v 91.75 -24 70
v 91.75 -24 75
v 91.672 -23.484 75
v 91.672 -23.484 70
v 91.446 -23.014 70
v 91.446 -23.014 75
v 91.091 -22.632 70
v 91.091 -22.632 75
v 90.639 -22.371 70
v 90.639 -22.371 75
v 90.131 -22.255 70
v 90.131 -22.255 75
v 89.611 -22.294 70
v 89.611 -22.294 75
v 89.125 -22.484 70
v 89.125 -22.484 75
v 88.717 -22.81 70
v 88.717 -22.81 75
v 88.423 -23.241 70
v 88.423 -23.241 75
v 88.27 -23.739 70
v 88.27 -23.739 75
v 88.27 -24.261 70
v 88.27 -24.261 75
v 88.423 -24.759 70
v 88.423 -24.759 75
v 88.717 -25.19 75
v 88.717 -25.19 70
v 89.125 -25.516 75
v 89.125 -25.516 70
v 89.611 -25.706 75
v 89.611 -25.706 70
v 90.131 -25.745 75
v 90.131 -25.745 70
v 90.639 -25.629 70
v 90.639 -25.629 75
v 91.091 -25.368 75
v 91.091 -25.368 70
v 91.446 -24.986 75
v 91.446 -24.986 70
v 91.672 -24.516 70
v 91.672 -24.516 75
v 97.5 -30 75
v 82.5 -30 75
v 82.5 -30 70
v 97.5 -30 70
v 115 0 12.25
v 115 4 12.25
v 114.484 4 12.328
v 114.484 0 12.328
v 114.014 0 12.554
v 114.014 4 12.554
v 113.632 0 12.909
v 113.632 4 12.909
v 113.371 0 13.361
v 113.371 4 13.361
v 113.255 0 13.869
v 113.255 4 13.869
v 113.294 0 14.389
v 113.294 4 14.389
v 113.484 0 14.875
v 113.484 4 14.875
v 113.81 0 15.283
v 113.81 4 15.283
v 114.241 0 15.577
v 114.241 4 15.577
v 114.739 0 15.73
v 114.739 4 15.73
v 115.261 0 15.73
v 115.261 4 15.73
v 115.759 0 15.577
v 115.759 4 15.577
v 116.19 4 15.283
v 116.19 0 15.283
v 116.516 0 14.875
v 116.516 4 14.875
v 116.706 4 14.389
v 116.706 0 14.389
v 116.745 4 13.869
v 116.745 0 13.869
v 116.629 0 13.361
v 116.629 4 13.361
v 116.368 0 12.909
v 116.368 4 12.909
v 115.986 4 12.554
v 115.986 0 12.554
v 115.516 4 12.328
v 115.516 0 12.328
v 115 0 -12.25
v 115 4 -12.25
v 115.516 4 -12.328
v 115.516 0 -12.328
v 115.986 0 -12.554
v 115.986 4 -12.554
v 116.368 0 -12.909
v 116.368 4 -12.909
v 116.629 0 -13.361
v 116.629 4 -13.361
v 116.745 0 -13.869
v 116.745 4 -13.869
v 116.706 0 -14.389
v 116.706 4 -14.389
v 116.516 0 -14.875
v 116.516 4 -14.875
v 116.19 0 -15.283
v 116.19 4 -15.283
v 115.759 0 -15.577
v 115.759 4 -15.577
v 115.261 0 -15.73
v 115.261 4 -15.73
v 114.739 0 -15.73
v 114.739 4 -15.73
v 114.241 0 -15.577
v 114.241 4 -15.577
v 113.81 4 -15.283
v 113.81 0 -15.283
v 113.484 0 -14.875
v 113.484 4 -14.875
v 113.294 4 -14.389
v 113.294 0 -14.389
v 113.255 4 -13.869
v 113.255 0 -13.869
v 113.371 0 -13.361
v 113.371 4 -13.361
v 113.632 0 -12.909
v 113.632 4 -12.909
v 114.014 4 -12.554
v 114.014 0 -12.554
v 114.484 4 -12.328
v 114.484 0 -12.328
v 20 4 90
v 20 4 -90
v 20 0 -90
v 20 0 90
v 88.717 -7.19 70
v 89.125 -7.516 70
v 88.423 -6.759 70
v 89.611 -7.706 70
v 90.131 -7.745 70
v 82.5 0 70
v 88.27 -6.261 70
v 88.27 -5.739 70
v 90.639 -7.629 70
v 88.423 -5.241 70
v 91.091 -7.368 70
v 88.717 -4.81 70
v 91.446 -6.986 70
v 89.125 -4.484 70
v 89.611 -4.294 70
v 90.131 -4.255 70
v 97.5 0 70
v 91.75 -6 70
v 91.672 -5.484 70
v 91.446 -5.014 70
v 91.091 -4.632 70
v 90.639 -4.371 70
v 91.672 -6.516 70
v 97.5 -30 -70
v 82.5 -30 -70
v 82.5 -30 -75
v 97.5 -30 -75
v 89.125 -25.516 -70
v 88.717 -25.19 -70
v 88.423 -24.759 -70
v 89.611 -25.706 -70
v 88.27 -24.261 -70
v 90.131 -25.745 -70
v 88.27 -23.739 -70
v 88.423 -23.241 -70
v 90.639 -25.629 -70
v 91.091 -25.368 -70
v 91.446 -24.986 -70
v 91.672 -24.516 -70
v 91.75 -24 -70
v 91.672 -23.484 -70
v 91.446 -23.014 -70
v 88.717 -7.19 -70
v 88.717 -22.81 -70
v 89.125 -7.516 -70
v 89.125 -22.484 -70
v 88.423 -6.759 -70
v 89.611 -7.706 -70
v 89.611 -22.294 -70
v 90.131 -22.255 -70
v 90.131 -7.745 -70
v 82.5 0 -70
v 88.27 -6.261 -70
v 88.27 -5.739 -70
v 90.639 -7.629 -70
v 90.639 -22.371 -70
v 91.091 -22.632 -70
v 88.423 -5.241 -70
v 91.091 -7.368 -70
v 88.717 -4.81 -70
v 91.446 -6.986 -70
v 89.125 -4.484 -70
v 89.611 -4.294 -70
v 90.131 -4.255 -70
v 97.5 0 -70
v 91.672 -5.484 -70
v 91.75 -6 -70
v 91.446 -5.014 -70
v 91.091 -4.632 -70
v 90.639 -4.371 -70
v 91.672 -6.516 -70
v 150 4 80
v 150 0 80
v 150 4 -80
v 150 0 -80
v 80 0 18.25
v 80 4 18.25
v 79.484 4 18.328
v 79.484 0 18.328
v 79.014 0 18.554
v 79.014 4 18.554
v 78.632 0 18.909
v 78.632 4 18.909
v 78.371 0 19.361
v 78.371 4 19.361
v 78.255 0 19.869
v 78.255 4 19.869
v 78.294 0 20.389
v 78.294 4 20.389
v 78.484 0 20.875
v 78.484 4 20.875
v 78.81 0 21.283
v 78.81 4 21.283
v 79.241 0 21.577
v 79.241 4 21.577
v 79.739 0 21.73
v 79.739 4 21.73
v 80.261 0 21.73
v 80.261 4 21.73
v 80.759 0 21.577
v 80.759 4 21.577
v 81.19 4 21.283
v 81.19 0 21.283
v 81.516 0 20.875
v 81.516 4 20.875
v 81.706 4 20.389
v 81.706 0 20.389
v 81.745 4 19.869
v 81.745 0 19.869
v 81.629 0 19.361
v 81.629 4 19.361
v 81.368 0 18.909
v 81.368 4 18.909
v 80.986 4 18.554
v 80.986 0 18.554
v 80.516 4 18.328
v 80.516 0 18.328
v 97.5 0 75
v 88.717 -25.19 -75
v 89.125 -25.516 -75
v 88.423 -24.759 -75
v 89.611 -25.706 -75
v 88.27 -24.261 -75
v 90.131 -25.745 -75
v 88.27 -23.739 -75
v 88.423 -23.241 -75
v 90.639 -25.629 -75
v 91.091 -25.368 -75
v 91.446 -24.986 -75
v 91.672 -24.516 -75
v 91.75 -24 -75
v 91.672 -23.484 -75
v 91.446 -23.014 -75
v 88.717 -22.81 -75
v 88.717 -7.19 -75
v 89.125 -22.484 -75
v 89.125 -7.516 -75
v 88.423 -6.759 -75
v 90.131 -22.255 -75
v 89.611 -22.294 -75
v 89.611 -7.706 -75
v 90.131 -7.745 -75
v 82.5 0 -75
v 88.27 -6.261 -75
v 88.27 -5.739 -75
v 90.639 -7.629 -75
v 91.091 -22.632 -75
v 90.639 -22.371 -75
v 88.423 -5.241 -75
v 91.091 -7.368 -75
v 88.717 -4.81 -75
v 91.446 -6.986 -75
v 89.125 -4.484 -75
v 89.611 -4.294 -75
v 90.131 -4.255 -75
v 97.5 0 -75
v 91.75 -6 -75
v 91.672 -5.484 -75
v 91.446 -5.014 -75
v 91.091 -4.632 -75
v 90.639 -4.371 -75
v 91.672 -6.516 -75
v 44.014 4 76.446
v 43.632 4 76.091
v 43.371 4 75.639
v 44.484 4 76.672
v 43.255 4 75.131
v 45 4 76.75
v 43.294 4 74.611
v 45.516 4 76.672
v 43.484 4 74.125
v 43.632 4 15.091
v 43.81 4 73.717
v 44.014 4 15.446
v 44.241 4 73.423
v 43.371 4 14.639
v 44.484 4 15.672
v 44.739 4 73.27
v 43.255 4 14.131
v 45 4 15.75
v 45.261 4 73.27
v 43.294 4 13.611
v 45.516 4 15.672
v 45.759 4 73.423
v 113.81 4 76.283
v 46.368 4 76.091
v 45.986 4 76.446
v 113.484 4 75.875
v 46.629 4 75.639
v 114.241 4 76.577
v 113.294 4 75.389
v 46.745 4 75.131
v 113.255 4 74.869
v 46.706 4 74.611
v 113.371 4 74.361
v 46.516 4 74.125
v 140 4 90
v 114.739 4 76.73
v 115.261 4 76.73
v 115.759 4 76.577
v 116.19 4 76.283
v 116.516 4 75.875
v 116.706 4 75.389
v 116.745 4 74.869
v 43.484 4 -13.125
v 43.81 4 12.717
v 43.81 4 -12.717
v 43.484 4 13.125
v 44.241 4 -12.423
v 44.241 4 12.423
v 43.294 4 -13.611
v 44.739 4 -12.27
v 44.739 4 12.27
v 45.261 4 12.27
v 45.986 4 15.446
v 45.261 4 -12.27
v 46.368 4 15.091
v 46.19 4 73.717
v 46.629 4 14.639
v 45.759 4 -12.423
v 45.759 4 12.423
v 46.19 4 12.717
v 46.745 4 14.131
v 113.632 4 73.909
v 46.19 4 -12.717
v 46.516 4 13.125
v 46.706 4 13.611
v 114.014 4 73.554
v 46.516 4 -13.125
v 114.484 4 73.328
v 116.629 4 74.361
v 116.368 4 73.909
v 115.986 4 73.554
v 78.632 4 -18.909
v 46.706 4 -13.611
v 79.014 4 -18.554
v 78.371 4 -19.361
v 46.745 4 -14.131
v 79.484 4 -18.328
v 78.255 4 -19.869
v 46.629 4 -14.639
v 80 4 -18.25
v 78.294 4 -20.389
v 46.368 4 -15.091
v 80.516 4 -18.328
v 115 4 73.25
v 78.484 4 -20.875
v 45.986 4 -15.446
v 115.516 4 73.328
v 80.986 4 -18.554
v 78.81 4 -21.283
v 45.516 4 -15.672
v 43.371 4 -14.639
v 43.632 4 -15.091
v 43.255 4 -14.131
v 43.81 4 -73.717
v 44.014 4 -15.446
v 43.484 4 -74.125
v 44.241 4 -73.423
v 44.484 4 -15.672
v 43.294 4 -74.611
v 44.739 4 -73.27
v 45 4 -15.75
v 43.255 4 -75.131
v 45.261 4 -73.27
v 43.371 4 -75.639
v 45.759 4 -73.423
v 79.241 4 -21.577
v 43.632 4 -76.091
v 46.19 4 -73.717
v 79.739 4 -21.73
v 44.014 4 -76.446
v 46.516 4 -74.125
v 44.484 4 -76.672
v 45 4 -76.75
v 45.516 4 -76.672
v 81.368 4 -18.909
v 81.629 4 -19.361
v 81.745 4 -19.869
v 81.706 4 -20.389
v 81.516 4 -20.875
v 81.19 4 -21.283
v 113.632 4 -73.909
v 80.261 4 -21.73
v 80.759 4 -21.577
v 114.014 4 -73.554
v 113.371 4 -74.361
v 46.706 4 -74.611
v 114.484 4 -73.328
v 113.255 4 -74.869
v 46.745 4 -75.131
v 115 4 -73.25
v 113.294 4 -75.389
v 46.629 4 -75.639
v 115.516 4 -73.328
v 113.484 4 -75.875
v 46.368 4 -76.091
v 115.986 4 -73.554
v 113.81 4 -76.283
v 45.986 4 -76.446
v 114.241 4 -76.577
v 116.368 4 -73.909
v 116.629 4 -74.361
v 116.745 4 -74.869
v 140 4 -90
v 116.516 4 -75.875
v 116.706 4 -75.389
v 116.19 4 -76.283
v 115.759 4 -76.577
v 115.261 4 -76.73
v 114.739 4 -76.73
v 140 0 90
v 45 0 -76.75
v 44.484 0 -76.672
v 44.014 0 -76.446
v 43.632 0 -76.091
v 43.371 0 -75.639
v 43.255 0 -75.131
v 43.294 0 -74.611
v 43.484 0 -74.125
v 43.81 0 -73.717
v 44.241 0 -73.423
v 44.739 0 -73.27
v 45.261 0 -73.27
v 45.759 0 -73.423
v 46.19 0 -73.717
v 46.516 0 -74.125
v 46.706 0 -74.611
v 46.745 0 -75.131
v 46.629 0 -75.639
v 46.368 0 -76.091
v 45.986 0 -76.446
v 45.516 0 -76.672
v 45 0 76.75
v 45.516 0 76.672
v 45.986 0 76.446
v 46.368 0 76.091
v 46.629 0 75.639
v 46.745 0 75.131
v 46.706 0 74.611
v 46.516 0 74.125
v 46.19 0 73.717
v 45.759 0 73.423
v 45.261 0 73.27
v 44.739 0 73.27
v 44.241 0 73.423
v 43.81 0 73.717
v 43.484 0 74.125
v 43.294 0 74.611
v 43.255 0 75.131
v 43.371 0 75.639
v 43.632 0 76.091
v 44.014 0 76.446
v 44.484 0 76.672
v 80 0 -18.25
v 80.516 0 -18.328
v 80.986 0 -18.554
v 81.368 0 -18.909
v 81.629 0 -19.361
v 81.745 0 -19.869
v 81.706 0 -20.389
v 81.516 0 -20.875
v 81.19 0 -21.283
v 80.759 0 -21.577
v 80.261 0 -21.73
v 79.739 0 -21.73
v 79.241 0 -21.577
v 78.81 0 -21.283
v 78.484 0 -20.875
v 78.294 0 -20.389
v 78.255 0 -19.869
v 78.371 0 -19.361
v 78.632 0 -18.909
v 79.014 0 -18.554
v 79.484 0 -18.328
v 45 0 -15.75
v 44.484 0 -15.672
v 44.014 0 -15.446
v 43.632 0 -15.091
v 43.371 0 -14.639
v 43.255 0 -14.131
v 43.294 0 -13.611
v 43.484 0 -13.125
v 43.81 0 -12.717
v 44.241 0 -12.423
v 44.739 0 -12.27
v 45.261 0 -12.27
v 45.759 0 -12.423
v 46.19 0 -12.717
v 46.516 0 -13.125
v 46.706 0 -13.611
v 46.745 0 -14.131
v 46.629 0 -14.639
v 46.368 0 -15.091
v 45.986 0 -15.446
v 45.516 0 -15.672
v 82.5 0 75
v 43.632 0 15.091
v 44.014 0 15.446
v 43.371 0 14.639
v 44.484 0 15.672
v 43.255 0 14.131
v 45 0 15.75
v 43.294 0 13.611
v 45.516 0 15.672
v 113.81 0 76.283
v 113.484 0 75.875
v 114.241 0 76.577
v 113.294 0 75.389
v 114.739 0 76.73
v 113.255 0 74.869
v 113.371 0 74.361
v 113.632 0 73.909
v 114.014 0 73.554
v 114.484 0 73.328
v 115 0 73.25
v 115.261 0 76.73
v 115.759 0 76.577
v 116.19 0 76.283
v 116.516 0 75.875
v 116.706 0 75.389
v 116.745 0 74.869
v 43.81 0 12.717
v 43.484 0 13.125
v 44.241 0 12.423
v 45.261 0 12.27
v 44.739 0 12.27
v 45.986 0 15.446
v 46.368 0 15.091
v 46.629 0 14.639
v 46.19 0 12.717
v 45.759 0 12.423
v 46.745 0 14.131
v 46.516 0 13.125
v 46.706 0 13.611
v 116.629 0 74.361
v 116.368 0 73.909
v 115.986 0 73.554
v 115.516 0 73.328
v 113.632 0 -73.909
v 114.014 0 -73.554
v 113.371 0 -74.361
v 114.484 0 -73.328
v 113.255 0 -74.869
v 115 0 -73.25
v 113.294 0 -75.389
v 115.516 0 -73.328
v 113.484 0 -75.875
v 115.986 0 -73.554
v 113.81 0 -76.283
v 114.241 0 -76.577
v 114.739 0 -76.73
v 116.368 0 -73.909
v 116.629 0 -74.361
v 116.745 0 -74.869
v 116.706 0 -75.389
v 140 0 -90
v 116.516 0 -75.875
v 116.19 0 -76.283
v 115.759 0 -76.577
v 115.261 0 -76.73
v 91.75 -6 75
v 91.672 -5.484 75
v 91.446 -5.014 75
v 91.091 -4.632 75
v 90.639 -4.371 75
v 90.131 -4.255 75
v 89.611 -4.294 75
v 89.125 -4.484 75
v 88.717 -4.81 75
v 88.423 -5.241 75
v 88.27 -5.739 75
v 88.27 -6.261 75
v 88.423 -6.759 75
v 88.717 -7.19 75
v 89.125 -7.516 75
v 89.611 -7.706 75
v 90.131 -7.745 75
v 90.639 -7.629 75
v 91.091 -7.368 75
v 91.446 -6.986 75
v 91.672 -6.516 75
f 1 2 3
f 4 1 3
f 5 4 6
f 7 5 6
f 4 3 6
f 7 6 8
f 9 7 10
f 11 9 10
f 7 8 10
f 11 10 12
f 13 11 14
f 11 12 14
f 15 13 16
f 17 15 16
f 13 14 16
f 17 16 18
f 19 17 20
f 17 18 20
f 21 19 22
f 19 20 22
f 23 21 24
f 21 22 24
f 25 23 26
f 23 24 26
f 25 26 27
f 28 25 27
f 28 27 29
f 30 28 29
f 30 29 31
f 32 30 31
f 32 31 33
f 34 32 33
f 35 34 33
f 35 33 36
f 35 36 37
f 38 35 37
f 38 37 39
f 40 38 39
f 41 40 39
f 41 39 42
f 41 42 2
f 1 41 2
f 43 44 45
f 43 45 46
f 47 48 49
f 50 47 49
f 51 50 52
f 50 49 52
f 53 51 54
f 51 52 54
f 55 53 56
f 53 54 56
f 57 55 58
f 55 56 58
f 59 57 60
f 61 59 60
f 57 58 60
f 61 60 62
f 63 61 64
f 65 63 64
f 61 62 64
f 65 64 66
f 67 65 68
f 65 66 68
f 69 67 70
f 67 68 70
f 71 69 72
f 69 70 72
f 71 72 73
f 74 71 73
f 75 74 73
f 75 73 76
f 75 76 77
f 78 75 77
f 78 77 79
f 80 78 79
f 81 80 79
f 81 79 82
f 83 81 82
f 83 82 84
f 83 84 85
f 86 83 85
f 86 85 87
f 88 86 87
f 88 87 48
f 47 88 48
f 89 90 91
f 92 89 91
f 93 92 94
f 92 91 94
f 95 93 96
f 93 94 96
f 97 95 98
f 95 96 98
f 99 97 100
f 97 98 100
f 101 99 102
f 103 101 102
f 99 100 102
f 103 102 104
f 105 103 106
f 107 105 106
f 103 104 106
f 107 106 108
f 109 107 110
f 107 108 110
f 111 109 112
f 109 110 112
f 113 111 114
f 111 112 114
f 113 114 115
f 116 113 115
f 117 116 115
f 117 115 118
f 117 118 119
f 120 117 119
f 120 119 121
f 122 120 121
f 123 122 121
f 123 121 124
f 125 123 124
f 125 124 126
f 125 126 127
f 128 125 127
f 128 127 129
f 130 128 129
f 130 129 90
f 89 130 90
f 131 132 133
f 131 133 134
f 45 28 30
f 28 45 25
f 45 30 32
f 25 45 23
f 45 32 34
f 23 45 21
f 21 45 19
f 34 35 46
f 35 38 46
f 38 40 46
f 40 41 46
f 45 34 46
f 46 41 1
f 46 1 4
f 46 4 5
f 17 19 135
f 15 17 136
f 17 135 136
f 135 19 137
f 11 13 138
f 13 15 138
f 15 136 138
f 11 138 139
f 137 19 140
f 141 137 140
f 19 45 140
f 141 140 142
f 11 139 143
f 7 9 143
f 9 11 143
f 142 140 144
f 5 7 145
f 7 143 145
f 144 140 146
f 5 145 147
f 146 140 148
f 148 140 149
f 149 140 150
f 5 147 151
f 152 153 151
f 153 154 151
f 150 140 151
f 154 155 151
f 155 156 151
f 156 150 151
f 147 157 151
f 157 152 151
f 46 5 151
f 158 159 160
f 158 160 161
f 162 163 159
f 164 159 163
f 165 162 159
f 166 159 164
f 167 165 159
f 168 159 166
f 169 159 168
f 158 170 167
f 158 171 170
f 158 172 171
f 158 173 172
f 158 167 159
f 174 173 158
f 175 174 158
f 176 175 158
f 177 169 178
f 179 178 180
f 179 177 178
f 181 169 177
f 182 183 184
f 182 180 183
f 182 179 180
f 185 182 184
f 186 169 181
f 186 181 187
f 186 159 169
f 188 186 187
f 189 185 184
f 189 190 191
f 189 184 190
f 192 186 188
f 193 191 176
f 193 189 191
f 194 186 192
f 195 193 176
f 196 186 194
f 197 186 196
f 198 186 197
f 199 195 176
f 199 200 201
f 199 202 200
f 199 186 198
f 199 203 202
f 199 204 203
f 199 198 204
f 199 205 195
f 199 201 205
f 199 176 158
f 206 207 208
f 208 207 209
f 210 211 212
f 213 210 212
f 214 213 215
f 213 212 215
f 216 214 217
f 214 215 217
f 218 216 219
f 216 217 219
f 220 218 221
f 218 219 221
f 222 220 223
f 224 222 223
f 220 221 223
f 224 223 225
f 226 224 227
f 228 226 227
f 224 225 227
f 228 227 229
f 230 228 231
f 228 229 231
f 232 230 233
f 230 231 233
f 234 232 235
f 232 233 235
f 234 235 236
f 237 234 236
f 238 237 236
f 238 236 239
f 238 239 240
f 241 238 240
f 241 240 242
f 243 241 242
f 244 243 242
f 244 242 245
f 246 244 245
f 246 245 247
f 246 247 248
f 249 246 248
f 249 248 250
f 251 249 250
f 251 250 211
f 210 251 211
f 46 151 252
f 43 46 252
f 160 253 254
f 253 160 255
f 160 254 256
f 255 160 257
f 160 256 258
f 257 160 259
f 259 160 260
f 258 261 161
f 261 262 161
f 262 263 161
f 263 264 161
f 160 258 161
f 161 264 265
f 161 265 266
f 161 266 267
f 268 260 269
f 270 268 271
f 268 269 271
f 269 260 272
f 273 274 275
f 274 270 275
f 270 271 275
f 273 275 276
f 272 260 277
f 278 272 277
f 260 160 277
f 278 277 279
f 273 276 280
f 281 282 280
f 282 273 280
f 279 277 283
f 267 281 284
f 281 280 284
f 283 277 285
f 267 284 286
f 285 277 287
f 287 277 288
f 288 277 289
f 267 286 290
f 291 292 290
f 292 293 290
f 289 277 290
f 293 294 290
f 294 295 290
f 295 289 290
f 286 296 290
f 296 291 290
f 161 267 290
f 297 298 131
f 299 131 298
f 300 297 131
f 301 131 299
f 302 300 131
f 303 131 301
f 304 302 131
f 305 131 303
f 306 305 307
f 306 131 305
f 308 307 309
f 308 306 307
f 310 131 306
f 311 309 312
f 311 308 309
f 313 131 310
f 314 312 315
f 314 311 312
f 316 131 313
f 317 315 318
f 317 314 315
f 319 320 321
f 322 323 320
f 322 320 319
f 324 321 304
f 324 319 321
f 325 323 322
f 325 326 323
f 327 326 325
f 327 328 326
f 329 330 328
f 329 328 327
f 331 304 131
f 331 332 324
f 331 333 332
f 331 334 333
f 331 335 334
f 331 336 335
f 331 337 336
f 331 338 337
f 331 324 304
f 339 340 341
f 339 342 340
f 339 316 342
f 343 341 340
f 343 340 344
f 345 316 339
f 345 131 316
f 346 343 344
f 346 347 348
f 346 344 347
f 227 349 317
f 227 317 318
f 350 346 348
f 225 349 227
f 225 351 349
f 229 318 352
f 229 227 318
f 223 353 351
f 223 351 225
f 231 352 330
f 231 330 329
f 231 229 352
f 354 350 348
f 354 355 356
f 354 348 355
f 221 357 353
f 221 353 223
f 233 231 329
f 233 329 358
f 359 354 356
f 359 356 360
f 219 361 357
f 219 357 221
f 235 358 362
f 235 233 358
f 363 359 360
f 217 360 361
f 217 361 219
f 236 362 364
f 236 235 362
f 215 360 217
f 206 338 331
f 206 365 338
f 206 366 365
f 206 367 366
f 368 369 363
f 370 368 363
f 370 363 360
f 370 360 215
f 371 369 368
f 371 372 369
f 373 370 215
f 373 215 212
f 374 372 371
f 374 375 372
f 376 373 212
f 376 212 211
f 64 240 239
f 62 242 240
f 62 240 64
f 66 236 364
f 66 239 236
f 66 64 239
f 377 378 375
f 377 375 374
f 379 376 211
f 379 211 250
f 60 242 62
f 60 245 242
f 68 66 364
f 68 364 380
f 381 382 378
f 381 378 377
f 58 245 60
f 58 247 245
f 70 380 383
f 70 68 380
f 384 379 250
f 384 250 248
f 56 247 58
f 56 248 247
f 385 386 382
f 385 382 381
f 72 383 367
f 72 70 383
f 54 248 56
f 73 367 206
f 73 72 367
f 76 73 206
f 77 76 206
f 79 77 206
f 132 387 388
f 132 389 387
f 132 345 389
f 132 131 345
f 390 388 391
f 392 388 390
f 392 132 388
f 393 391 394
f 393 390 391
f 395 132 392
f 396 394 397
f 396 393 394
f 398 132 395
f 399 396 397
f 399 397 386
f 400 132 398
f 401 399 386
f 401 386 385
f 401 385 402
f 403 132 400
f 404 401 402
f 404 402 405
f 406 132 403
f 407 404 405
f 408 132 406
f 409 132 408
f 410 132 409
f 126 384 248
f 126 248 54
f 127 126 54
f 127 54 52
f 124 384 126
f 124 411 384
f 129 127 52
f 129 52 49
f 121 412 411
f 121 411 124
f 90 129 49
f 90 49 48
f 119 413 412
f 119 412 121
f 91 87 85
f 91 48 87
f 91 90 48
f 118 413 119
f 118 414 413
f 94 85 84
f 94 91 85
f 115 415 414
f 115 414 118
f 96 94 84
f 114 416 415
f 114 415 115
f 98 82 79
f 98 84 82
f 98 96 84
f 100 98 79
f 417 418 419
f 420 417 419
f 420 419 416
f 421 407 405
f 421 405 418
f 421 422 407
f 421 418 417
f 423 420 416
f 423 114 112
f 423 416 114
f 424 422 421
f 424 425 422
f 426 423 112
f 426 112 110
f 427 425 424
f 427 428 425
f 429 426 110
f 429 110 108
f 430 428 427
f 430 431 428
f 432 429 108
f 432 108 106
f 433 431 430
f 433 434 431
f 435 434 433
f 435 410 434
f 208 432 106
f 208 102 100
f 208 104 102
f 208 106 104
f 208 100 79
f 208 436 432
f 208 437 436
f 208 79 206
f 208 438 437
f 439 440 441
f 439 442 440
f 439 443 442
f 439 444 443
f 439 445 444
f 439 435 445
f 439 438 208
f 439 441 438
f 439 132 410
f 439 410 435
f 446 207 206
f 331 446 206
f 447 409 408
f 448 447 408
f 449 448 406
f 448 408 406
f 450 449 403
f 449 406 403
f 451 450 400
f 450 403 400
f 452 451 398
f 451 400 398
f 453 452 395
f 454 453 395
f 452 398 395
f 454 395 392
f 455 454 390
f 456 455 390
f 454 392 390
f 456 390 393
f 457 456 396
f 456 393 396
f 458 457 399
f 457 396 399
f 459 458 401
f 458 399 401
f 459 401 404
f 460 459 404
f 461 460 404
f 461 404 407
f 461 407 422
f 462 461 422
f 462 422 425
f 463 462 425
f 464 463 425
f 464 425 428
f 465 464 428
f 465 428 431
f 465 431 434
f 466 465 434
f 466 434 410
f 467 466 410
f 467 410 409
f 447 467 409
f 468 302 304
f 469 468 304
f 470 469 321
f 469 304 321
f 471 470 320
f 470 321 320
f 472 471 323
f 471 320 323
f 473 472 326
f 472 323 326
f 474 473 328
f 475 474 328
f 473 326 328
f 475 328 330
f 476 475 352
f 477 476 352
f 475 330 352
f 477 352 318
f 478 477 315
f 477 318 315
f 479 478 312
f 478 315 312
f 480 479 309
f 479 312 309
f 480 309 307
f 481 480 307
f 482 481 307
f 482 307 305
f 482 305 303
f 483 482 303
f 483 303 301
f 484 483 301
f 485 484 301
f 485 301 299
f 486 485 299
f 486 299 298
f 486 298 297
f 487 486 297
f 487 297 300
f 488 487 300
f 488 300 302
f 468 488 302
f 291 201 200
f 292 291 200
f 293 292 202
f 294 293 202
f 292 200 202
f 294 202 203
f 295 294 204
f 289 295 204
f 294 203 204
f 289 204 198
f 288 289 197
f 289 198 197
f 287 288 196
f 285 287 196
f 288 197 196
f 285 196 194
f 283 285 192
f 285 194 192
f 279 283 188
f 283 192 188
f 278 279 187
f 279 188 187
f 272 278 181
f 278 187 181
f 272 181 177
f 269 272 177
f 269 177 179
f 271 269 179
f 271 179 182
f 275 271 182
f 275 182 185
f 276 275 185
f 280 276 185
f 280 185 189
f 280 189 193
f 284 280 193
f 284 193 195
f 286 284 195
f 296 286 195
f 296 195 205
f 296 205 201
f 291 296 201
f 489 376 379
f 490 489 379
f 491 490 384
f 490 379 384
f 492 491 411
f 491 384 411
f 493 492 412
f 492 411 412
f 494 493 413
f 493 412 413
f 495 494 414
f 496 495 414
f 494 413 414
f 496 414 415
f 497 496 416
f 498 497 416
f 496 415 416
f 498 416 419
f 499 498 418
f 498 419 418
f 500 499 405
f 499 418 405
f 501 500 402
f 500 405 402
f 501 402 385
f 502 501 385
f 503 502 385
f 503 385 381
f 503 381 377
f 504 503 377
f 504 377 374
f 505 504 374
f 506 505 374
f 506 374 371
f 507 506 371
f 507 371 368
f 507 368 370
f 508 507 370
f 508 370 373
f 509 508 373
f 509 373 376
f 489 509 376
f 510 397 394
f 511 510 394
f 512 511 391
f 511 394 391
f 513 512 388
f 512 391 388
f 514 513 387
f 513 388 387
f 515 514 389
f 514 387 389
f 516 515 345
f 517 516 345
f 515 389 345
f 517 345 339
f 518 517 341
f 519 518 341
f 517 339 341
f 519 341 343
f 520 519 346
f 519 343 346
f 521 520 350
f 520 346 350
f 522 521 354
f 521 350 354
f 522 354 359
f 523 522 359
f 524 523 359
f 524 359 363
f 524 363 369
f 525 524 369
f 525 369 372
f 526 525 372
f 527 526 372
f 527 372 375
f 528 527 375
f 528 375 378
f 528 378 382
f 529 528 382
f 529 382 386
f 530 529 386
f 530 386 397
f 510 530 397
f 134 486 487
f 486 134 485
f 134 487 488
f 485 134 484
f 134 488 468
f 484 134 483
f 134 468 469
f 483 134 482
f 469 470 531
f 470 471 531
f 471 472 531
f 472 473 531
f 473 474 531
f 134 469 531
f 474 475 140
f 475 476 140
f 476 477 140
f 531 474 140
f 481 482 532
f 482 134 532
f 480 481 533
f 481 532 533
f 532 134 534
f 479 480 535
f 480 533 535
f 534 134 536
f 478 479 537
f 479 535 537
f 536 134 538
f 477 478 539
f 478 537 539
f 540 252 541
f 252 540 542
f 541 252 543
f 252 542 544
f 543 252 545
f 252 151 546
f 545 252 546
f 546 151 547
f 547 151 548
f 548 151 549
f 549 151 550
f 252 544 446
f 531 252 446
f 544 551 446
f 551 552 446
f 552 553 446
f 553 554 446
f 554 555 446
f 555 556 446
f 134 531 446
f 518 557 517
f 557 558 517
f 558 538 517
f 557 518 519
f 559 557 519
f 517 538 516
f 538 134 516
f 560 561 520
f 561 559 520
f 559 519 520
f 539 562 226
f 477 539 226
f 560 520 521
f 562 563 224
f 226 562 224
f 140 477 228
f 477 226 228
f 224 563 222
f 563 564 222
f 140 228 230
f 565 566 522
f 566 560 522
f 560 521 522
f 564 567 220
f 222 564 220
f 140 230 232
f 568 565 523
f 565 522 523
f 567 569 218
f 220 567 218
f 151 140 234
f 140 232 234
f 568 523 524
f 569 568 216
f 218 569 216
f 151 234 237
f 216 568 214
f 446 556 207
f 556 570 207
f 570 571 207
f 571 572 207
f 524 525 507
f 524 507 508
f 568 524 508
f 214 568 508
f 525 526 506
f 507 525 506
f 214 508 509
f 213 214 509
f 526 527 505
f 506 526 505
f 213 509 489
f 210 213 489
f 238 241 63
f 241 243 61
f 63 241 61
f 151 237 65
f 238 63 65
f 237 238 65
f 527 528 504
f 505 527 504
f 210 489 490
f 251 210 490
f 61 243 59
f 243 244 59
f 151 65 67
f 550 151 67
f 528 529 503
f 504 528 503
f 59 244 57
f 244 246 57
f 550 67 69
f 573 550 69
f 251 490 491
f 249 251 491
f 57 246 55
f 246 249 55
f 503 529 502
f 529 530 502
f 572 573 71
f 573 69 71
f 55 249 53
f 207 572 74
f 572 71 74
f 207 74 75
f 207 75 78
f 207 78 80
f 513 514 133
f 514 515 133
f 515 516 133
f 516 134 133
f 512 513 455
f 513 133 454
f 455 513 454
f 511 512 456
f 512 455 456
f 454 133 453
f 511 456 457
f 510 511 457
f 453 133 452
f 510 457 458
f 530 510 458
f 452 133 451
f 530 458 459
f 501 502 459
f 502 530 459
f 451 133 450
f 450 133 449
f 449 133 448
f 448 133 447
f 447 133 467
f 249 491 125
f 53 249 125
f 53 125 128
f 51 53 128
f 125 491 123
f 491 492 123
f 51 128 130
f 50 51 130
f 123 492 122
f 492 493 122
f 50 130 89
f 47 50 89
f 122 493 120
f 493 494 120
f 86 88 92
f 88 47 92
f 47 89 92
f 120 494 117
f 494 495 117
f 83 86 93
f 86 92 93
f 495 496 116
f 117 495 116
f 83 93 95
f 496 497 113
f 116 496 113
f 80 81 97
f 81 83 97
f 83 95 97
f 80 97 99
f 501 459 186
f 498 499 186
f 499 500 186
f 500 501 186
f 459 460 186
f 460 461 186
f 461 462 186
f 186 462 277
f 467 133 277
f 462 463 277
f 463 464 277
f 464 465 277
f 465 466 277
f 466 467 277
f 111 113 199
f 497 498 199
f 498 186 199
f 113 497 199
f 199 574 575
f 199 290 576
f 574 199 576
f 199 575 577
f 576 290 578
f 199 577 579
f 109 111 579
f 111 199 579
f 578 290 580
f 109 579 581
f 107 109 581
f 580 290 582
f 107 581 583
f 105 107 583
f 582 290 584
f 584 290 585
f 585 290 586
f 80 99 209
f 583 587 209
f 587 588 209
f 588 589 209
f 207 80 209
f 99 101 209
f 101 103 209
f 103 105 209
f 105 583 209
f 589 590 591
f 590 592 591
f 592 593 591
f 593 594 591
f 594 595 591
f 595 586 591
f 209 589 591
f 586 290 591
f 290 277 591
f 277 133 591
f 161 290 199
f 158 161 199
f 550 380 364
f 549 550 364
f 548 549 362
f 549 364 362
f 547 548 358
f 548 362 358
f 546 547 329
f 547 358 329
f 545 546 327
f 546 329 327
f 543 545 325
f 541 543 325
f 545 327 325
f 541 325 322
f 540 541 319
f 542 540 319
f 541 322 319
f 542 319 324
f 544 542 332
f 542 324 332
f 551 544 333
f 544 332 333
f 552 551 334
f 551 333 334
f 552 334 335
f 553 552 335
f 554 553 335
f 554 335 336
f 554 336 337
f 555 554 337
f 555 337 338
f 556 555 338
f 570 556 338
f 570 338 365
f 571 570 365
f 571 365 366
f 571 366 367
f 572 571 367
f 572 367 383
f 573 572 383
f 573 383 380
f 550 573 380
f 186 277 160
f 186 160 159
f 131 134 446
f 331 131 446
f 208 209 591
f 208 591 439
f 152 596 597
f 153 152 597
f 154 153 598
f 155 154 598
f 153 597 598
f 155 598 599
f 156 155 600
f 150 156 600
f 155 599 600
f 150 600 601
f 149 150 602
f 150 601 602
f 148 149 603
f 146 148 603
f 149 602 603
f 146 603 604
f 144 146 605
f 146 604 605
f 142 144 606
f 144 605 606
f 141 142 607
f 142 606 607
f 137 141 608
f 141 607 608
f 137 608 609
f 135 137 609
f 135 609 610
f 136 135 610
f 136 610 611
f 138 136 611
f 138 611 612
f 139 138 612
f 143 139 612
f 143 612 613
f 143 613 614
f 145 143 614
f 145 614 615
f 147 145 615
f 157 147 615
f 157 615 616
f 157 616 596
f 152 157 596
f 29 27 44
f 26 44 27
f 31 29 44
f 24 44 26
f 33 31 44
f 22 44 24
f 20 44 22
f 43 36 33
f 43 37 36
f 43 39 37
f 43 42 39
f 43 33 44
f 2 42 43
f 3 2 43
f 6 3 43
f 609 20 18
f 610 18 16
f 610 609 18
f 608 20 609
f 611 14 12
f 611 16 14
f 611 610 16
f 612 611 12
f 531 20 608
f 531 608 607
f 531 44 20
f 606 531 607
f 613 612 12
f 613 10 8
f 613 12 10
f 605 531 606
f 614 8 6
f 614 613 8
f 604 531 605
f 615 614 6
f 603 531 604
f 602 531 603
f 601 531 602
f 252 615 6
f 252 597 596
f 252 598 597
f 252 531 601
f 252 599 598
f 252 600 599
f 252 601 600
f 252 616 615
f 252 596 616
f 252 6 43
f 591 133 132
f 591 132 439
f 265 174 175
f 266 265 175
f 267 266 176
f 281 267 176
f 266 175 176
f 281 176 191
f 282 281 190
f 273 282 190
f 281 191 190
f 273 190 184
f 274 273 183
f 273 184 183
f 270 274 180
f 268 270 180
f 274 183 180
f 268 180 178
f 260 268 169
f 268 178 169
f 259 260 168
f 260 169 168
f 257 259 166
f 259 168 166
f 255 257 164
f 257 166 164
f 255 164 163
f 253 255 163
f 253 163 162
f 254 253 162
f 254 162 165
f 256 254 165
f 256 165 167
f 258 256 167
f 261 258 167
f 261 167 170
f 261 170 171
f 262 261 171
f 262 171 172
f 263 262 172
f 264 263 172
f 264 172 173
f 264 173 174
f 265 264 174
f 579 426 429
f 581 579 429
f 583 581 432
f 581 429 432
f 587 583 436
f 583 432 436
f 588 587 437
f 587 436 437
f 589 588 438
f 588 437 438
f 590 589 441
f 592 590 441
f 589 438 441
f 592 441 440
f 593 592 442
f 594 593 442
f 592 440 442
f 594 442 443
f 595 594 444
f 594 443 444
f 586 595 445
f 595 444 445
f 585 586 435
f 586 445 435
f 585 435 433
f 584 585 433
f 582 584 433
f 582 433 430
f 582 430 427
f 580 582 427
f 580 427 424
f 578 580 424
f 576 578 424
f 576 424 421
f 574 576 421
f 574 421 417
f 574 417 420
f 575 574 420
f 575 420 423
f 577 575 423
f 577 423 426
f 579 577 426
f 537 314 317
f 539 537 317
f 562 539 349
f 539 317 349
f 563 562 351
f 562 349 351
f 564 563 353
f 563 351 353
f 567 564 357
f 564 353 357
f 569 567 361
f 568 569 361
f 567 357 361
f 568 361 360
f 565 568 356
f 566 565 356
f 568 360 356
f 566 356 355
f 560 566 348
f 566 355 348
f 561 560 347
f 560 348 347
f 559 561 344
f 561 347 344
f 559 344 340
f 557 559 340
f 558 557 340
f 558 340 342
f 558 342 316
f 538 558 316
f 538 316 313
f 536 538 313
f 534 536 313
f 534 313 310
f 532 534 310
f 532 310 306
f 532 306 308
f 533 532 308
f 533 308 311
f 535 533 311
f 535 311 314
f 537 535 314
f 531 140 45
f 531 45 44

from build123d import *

# Parameters (mm, degrees)
SKETCH1_W               = 300
SKETCH1_H               = 180
MAIN_BODY_DEPTH         = 4
FILLET1_R               = 10
CHAMFER1_SIZE           = 10
SKETCH2_R               = 1.75
BATTERIES_HOLES_DEPTH   = 15
SKETCH5_R               = 1.75
SKETCH5_W               = 15
SKETCH5_H               = 10
L298N_HOLES_DEPTH       = 15
SKETCH6_R               = 1.75
LM2596_HOLES_DEPTH      = 15
SKETCH7_R               = 1.55
ESP32_HOLES_DEPTH       = 15
SKETCH8_R               = 1.75
PCB_SENSORS_HOLES_DEPTH = 15
SKETCH9_W               = 15
SKETCH9_H               = 5
WHEELS_LEGS_DEPTH       = 30
SKETCH10_R              = 1.75
MOTOR_HOLES_DEPTH       = 300
SKETCH11_R              = 1.75
SKETCH11_W              = 30
SKETCH11_H              = 20
SENSORS_HOLES_DEPTH     = 15
SKETCH13_W              = 40
SKETCH13_H              = 75
CUT_EXTRUDE2_DEPTH      = 10
FILLET2_R               = 10
SKETCH12_R              = 1.75
CUT_EXTRUDE3_DEPTH      = 10
SKETCH14_W              = 212.137898895
SKETCH14_H              = 97.482026014
CUT_EXTRUDE4_DEPTH      = 200


with BuildPart() as part:
    # Sketch1 → Main Body (new body)
    with BuildSketch(Plane(origin=(0, 0, 0), x_dir=(1, 0, 0), z_dir=(0, 1, 0))):
        Rectangle(SKETCH1_W, SKETCH1_H)
    extrude(amount=MAIN_BODY_DEPTH)

    # Fillet1
    fillet1_edges = [part.edges().sort_by_distance(p)[0] for p in [
        (-150, 2, 90),
        (-150, 2, -90),
    ]]
    fillet(fillet1_edges, radius=FILLET1_R)

    # Chamfer1
    chamfer1_edges = [part.edges().sort_by_distance(p)[0] for p in [
        (150, 2, 90),
        (150, 2, -90),
    ]]
    chamfer(chamfer1_edges, length=CHAMFER1_SIZE)

    # Sketch2 → Batteries holes (cut)
    with BuildSketch(Plane(origin=(0, 4, 0), x_dir=(1, 0, 0), z_dir=(0, 1, 0))):
        with Locations((115, 75)):
            Circle(SKETCH2_R)
        with Locations((115, 14)):
            Circle(SKETCH2_R)
        with Locations((115, -14)):
            Circle(SKETCH2_R)
        with Locations((115, -75)):
            Circle(SKETCH2_R)
        with Locations((45, -75)):
            Circle(SKETCH2_R)
        with Locations((45, -14)):
            Circle(SKETCH2_R)
        with Locations((45, 14)):
            Circle(SKETCH2_R)
        with Locations((45, 75)):
            Circle(SKETCH2_R)
    extrude(amount=-BATTERIES_HOLES_DEPTH, mode=Mode.SUBTRACT)

    # Sketch5 → L298N holes (cut)
    with BuildSketch(Plane(origin=(0, 4, 0), x_dir=(1, 0, 0), z_dir=(0, 1, 0))):
        with Locations((-37, 18.5)):
            Circle(SKETCH5_R)
        with Locations((0, 18.5)):
            Circle(SKETCH5_R)
        with Locations((-37, -18.5)):
            Circle(SKETCH5_R)
        with Locations((0, -18.5)):
            Circle(SKETCH5_R)
        with Locations((-12.5, -38.5)):
            Rectangle(SKETCH5_W, SKETCH5_H)
        with Locations((-12.5, 38.5)):
            Rectangle(SKETCH5_W, SKETCH5_H)
    extrude(amount=-L298N_HOLES_DEPTH, mode=Mode.SUBTRACT)

    # Sketch6 → LM2596 holes (cut)
    with BuildSketch(Plane(origin=(0, 4, 0), x_dir=(1, 0, 0), z_dir=(0, 1, 0))):
        with Locations((-33, 70)):
            Circle(SKETCH6_R)
        with Locations((-3, 54)):
            Circle(SKETCH6_R)
        with Locations((-33, -54)):
            Circle(SKETCH6_R)
        with Locations((-3, -70)):
            Circle(SKETCH6_R)
    extrude(amount=-LM2596_HOLES_DEPTH, mode=Mode.SUBTRACT)

    # Sketch7 → ESP32 holes (cut)
    with BuildSketch(Plane(origin=(0, 4, 0), x_dir=(1, 0, 0), z_dir=(0, 1, 0))):
        with Locations((-73, 65)):
            Circle(SKETCH7_R)
        with Locations((-73, 19)):
            Circle(SKETCH7_R)
        with Locations((-91, 19)):
            Circle(SKETCH7_R)
    extrude(amount=-ESP32_HOLES_DEPTH, mode=Mode.SUBTRACT)

    # Sketch8 → PCB sensors holes (cut)
    with BuildSketch(Plane(origin=(0, 4, 0), x_dir=(1, 0, 0), z_dir=(0, 1, 0))):
        with Locations((-103, -54)):
            Circle(SKETCH8_R)
        with Locations((-68, -54)):
            Circle(SKETCH8_R)
    extrude(amount=-PCB_SENSORS_HOLES_DEPTH, mode=Mode.SUBTRACT)

    # Sketch9 → Wheels legs (add)
    with BuildSketch(Plane.XZ):
        with Locations((-90, 72.5)):
            Rectangle(SKETCH9_W, SKETCH9_H)
        with Locations((90, 72.5)):
            Rectangle(SKETCH9_W, SKETCH9_H)
        with Locations((90, -72.5)):
            Rectangle(SKETCH9_W, SKETCH9_H)
        with Locations((-90, -72.5)):
            Rectangle(SKETCH9_W, SKETCH9_H)
    extrude(amount=WHEELS_LEGS_DEPTH)

    # Sketch10 → Motor holes (cut)
    with BuildSketch(Plane.XY.offset(75)):
        with Locations((-90, -24)):
            Circle(SKETCH10_R)
        with Locations((-90, -6)):
            Circle(SKETCH10_R)
        with Locations((90, -6)):
            Circle(SKETCH10_R)
        with Locations((90, -24)):
            Circle(SKETCH10_R)
    extrude(amount=-MOTOR_HOLES_DEPTH, mode=Mode.SUBTRACT)

    # Sketch11 → Sensors holes (cut)
    with BuildSketch(Plane(origin=(0, 4, 0), x_dir=(1, 0, 0), z_dir=(0, 1, 0))):
        with Locations((-140, 10)):
            Circle(SKETCH11_R)
        with Locations((-125, 10)):
            Circle(SKETCH11_R)
        with Locations((-125, 30)):
            Circle(SKETCH11_R)
        with Locations((-140, 30)):
            Circle(SKETCH11_R)
        with Locations((-125, -30)):
            Circle(SKETCH11_R)
        with Locations((-140, -30)):
            Circle(SKETCH11_R)
        with Locations((-125, -10)):
            Circle(SKETCH11_R)
        with Locations((-140, -10)):
            Circle(SKETCH11_R)
        with Locations((-85, 0)):
            Rectangle(SKETCH11_W, SKETCH11_H)
    extrude(amount=-SENSORS_HOLES_DEPTH, mode=Mode.SUBTRACT)

    # Sketch13 → Cut-Extrude2 (cut)
    with BuildSketch(Plane.XZ):
        with Locations((-133, 75.5)):
            Rectangle(SKETCH13_W, SKETCH13_H)
        with Locations((-133, -75.5)):
            Rectangle(SKETCH13_W, SKETCH13_H)
    extrude(amount=-CUT_EXTRUDE2_DEPTH, mode=Mode.SUBTRACT)

    # Fillet2
    fillet2_edges = [part.edges().sort_by_distance(p)[0] for p in [
        (-113, 2, -90),
        (-113, 2, -38),
        (-150, 2, -38),
        (-150, 2, 38),
        (-113, 2, 90),
        (-113, 2, 38),
    ]]
    fillet(fillet2_edges, radius=FILLET2_R)

    # Sketch12 → Cut-Extrude3 (cut)
    with BuildSketch(Plane(origin=(0, 4, 0), x_dir=(1, 0, 0), z_dir=(0, 1, 0))):
        with Locations((80, 20)):
            Circle(SKETCH12_R)
        with Locations((80, -20)):
            Circle(SKETCH12_R)
        with Locations((-20, -20)):
            Circle(SKETCH12_R)
        with Locations((-20, 20)):
            Circle(SKETCH12_R)
    extrude(amount=-CUT_EXTRUDE3_DEPTH, mode=Mode.SUBTRACT)

    # Sketch14 → Cut-Extrude4 (cut)
    with BuildSketch(Plane.ZY.offset(-20)):
        with Locations((1.063142902, -9.465230627)):
            Rectangle(SKETCH14_W, SKETCH14_H)
    extrude(amount=CUT_EXTRUDE4_DEPTH, mode=Mode.SUBTRACT)


solid = part.part
